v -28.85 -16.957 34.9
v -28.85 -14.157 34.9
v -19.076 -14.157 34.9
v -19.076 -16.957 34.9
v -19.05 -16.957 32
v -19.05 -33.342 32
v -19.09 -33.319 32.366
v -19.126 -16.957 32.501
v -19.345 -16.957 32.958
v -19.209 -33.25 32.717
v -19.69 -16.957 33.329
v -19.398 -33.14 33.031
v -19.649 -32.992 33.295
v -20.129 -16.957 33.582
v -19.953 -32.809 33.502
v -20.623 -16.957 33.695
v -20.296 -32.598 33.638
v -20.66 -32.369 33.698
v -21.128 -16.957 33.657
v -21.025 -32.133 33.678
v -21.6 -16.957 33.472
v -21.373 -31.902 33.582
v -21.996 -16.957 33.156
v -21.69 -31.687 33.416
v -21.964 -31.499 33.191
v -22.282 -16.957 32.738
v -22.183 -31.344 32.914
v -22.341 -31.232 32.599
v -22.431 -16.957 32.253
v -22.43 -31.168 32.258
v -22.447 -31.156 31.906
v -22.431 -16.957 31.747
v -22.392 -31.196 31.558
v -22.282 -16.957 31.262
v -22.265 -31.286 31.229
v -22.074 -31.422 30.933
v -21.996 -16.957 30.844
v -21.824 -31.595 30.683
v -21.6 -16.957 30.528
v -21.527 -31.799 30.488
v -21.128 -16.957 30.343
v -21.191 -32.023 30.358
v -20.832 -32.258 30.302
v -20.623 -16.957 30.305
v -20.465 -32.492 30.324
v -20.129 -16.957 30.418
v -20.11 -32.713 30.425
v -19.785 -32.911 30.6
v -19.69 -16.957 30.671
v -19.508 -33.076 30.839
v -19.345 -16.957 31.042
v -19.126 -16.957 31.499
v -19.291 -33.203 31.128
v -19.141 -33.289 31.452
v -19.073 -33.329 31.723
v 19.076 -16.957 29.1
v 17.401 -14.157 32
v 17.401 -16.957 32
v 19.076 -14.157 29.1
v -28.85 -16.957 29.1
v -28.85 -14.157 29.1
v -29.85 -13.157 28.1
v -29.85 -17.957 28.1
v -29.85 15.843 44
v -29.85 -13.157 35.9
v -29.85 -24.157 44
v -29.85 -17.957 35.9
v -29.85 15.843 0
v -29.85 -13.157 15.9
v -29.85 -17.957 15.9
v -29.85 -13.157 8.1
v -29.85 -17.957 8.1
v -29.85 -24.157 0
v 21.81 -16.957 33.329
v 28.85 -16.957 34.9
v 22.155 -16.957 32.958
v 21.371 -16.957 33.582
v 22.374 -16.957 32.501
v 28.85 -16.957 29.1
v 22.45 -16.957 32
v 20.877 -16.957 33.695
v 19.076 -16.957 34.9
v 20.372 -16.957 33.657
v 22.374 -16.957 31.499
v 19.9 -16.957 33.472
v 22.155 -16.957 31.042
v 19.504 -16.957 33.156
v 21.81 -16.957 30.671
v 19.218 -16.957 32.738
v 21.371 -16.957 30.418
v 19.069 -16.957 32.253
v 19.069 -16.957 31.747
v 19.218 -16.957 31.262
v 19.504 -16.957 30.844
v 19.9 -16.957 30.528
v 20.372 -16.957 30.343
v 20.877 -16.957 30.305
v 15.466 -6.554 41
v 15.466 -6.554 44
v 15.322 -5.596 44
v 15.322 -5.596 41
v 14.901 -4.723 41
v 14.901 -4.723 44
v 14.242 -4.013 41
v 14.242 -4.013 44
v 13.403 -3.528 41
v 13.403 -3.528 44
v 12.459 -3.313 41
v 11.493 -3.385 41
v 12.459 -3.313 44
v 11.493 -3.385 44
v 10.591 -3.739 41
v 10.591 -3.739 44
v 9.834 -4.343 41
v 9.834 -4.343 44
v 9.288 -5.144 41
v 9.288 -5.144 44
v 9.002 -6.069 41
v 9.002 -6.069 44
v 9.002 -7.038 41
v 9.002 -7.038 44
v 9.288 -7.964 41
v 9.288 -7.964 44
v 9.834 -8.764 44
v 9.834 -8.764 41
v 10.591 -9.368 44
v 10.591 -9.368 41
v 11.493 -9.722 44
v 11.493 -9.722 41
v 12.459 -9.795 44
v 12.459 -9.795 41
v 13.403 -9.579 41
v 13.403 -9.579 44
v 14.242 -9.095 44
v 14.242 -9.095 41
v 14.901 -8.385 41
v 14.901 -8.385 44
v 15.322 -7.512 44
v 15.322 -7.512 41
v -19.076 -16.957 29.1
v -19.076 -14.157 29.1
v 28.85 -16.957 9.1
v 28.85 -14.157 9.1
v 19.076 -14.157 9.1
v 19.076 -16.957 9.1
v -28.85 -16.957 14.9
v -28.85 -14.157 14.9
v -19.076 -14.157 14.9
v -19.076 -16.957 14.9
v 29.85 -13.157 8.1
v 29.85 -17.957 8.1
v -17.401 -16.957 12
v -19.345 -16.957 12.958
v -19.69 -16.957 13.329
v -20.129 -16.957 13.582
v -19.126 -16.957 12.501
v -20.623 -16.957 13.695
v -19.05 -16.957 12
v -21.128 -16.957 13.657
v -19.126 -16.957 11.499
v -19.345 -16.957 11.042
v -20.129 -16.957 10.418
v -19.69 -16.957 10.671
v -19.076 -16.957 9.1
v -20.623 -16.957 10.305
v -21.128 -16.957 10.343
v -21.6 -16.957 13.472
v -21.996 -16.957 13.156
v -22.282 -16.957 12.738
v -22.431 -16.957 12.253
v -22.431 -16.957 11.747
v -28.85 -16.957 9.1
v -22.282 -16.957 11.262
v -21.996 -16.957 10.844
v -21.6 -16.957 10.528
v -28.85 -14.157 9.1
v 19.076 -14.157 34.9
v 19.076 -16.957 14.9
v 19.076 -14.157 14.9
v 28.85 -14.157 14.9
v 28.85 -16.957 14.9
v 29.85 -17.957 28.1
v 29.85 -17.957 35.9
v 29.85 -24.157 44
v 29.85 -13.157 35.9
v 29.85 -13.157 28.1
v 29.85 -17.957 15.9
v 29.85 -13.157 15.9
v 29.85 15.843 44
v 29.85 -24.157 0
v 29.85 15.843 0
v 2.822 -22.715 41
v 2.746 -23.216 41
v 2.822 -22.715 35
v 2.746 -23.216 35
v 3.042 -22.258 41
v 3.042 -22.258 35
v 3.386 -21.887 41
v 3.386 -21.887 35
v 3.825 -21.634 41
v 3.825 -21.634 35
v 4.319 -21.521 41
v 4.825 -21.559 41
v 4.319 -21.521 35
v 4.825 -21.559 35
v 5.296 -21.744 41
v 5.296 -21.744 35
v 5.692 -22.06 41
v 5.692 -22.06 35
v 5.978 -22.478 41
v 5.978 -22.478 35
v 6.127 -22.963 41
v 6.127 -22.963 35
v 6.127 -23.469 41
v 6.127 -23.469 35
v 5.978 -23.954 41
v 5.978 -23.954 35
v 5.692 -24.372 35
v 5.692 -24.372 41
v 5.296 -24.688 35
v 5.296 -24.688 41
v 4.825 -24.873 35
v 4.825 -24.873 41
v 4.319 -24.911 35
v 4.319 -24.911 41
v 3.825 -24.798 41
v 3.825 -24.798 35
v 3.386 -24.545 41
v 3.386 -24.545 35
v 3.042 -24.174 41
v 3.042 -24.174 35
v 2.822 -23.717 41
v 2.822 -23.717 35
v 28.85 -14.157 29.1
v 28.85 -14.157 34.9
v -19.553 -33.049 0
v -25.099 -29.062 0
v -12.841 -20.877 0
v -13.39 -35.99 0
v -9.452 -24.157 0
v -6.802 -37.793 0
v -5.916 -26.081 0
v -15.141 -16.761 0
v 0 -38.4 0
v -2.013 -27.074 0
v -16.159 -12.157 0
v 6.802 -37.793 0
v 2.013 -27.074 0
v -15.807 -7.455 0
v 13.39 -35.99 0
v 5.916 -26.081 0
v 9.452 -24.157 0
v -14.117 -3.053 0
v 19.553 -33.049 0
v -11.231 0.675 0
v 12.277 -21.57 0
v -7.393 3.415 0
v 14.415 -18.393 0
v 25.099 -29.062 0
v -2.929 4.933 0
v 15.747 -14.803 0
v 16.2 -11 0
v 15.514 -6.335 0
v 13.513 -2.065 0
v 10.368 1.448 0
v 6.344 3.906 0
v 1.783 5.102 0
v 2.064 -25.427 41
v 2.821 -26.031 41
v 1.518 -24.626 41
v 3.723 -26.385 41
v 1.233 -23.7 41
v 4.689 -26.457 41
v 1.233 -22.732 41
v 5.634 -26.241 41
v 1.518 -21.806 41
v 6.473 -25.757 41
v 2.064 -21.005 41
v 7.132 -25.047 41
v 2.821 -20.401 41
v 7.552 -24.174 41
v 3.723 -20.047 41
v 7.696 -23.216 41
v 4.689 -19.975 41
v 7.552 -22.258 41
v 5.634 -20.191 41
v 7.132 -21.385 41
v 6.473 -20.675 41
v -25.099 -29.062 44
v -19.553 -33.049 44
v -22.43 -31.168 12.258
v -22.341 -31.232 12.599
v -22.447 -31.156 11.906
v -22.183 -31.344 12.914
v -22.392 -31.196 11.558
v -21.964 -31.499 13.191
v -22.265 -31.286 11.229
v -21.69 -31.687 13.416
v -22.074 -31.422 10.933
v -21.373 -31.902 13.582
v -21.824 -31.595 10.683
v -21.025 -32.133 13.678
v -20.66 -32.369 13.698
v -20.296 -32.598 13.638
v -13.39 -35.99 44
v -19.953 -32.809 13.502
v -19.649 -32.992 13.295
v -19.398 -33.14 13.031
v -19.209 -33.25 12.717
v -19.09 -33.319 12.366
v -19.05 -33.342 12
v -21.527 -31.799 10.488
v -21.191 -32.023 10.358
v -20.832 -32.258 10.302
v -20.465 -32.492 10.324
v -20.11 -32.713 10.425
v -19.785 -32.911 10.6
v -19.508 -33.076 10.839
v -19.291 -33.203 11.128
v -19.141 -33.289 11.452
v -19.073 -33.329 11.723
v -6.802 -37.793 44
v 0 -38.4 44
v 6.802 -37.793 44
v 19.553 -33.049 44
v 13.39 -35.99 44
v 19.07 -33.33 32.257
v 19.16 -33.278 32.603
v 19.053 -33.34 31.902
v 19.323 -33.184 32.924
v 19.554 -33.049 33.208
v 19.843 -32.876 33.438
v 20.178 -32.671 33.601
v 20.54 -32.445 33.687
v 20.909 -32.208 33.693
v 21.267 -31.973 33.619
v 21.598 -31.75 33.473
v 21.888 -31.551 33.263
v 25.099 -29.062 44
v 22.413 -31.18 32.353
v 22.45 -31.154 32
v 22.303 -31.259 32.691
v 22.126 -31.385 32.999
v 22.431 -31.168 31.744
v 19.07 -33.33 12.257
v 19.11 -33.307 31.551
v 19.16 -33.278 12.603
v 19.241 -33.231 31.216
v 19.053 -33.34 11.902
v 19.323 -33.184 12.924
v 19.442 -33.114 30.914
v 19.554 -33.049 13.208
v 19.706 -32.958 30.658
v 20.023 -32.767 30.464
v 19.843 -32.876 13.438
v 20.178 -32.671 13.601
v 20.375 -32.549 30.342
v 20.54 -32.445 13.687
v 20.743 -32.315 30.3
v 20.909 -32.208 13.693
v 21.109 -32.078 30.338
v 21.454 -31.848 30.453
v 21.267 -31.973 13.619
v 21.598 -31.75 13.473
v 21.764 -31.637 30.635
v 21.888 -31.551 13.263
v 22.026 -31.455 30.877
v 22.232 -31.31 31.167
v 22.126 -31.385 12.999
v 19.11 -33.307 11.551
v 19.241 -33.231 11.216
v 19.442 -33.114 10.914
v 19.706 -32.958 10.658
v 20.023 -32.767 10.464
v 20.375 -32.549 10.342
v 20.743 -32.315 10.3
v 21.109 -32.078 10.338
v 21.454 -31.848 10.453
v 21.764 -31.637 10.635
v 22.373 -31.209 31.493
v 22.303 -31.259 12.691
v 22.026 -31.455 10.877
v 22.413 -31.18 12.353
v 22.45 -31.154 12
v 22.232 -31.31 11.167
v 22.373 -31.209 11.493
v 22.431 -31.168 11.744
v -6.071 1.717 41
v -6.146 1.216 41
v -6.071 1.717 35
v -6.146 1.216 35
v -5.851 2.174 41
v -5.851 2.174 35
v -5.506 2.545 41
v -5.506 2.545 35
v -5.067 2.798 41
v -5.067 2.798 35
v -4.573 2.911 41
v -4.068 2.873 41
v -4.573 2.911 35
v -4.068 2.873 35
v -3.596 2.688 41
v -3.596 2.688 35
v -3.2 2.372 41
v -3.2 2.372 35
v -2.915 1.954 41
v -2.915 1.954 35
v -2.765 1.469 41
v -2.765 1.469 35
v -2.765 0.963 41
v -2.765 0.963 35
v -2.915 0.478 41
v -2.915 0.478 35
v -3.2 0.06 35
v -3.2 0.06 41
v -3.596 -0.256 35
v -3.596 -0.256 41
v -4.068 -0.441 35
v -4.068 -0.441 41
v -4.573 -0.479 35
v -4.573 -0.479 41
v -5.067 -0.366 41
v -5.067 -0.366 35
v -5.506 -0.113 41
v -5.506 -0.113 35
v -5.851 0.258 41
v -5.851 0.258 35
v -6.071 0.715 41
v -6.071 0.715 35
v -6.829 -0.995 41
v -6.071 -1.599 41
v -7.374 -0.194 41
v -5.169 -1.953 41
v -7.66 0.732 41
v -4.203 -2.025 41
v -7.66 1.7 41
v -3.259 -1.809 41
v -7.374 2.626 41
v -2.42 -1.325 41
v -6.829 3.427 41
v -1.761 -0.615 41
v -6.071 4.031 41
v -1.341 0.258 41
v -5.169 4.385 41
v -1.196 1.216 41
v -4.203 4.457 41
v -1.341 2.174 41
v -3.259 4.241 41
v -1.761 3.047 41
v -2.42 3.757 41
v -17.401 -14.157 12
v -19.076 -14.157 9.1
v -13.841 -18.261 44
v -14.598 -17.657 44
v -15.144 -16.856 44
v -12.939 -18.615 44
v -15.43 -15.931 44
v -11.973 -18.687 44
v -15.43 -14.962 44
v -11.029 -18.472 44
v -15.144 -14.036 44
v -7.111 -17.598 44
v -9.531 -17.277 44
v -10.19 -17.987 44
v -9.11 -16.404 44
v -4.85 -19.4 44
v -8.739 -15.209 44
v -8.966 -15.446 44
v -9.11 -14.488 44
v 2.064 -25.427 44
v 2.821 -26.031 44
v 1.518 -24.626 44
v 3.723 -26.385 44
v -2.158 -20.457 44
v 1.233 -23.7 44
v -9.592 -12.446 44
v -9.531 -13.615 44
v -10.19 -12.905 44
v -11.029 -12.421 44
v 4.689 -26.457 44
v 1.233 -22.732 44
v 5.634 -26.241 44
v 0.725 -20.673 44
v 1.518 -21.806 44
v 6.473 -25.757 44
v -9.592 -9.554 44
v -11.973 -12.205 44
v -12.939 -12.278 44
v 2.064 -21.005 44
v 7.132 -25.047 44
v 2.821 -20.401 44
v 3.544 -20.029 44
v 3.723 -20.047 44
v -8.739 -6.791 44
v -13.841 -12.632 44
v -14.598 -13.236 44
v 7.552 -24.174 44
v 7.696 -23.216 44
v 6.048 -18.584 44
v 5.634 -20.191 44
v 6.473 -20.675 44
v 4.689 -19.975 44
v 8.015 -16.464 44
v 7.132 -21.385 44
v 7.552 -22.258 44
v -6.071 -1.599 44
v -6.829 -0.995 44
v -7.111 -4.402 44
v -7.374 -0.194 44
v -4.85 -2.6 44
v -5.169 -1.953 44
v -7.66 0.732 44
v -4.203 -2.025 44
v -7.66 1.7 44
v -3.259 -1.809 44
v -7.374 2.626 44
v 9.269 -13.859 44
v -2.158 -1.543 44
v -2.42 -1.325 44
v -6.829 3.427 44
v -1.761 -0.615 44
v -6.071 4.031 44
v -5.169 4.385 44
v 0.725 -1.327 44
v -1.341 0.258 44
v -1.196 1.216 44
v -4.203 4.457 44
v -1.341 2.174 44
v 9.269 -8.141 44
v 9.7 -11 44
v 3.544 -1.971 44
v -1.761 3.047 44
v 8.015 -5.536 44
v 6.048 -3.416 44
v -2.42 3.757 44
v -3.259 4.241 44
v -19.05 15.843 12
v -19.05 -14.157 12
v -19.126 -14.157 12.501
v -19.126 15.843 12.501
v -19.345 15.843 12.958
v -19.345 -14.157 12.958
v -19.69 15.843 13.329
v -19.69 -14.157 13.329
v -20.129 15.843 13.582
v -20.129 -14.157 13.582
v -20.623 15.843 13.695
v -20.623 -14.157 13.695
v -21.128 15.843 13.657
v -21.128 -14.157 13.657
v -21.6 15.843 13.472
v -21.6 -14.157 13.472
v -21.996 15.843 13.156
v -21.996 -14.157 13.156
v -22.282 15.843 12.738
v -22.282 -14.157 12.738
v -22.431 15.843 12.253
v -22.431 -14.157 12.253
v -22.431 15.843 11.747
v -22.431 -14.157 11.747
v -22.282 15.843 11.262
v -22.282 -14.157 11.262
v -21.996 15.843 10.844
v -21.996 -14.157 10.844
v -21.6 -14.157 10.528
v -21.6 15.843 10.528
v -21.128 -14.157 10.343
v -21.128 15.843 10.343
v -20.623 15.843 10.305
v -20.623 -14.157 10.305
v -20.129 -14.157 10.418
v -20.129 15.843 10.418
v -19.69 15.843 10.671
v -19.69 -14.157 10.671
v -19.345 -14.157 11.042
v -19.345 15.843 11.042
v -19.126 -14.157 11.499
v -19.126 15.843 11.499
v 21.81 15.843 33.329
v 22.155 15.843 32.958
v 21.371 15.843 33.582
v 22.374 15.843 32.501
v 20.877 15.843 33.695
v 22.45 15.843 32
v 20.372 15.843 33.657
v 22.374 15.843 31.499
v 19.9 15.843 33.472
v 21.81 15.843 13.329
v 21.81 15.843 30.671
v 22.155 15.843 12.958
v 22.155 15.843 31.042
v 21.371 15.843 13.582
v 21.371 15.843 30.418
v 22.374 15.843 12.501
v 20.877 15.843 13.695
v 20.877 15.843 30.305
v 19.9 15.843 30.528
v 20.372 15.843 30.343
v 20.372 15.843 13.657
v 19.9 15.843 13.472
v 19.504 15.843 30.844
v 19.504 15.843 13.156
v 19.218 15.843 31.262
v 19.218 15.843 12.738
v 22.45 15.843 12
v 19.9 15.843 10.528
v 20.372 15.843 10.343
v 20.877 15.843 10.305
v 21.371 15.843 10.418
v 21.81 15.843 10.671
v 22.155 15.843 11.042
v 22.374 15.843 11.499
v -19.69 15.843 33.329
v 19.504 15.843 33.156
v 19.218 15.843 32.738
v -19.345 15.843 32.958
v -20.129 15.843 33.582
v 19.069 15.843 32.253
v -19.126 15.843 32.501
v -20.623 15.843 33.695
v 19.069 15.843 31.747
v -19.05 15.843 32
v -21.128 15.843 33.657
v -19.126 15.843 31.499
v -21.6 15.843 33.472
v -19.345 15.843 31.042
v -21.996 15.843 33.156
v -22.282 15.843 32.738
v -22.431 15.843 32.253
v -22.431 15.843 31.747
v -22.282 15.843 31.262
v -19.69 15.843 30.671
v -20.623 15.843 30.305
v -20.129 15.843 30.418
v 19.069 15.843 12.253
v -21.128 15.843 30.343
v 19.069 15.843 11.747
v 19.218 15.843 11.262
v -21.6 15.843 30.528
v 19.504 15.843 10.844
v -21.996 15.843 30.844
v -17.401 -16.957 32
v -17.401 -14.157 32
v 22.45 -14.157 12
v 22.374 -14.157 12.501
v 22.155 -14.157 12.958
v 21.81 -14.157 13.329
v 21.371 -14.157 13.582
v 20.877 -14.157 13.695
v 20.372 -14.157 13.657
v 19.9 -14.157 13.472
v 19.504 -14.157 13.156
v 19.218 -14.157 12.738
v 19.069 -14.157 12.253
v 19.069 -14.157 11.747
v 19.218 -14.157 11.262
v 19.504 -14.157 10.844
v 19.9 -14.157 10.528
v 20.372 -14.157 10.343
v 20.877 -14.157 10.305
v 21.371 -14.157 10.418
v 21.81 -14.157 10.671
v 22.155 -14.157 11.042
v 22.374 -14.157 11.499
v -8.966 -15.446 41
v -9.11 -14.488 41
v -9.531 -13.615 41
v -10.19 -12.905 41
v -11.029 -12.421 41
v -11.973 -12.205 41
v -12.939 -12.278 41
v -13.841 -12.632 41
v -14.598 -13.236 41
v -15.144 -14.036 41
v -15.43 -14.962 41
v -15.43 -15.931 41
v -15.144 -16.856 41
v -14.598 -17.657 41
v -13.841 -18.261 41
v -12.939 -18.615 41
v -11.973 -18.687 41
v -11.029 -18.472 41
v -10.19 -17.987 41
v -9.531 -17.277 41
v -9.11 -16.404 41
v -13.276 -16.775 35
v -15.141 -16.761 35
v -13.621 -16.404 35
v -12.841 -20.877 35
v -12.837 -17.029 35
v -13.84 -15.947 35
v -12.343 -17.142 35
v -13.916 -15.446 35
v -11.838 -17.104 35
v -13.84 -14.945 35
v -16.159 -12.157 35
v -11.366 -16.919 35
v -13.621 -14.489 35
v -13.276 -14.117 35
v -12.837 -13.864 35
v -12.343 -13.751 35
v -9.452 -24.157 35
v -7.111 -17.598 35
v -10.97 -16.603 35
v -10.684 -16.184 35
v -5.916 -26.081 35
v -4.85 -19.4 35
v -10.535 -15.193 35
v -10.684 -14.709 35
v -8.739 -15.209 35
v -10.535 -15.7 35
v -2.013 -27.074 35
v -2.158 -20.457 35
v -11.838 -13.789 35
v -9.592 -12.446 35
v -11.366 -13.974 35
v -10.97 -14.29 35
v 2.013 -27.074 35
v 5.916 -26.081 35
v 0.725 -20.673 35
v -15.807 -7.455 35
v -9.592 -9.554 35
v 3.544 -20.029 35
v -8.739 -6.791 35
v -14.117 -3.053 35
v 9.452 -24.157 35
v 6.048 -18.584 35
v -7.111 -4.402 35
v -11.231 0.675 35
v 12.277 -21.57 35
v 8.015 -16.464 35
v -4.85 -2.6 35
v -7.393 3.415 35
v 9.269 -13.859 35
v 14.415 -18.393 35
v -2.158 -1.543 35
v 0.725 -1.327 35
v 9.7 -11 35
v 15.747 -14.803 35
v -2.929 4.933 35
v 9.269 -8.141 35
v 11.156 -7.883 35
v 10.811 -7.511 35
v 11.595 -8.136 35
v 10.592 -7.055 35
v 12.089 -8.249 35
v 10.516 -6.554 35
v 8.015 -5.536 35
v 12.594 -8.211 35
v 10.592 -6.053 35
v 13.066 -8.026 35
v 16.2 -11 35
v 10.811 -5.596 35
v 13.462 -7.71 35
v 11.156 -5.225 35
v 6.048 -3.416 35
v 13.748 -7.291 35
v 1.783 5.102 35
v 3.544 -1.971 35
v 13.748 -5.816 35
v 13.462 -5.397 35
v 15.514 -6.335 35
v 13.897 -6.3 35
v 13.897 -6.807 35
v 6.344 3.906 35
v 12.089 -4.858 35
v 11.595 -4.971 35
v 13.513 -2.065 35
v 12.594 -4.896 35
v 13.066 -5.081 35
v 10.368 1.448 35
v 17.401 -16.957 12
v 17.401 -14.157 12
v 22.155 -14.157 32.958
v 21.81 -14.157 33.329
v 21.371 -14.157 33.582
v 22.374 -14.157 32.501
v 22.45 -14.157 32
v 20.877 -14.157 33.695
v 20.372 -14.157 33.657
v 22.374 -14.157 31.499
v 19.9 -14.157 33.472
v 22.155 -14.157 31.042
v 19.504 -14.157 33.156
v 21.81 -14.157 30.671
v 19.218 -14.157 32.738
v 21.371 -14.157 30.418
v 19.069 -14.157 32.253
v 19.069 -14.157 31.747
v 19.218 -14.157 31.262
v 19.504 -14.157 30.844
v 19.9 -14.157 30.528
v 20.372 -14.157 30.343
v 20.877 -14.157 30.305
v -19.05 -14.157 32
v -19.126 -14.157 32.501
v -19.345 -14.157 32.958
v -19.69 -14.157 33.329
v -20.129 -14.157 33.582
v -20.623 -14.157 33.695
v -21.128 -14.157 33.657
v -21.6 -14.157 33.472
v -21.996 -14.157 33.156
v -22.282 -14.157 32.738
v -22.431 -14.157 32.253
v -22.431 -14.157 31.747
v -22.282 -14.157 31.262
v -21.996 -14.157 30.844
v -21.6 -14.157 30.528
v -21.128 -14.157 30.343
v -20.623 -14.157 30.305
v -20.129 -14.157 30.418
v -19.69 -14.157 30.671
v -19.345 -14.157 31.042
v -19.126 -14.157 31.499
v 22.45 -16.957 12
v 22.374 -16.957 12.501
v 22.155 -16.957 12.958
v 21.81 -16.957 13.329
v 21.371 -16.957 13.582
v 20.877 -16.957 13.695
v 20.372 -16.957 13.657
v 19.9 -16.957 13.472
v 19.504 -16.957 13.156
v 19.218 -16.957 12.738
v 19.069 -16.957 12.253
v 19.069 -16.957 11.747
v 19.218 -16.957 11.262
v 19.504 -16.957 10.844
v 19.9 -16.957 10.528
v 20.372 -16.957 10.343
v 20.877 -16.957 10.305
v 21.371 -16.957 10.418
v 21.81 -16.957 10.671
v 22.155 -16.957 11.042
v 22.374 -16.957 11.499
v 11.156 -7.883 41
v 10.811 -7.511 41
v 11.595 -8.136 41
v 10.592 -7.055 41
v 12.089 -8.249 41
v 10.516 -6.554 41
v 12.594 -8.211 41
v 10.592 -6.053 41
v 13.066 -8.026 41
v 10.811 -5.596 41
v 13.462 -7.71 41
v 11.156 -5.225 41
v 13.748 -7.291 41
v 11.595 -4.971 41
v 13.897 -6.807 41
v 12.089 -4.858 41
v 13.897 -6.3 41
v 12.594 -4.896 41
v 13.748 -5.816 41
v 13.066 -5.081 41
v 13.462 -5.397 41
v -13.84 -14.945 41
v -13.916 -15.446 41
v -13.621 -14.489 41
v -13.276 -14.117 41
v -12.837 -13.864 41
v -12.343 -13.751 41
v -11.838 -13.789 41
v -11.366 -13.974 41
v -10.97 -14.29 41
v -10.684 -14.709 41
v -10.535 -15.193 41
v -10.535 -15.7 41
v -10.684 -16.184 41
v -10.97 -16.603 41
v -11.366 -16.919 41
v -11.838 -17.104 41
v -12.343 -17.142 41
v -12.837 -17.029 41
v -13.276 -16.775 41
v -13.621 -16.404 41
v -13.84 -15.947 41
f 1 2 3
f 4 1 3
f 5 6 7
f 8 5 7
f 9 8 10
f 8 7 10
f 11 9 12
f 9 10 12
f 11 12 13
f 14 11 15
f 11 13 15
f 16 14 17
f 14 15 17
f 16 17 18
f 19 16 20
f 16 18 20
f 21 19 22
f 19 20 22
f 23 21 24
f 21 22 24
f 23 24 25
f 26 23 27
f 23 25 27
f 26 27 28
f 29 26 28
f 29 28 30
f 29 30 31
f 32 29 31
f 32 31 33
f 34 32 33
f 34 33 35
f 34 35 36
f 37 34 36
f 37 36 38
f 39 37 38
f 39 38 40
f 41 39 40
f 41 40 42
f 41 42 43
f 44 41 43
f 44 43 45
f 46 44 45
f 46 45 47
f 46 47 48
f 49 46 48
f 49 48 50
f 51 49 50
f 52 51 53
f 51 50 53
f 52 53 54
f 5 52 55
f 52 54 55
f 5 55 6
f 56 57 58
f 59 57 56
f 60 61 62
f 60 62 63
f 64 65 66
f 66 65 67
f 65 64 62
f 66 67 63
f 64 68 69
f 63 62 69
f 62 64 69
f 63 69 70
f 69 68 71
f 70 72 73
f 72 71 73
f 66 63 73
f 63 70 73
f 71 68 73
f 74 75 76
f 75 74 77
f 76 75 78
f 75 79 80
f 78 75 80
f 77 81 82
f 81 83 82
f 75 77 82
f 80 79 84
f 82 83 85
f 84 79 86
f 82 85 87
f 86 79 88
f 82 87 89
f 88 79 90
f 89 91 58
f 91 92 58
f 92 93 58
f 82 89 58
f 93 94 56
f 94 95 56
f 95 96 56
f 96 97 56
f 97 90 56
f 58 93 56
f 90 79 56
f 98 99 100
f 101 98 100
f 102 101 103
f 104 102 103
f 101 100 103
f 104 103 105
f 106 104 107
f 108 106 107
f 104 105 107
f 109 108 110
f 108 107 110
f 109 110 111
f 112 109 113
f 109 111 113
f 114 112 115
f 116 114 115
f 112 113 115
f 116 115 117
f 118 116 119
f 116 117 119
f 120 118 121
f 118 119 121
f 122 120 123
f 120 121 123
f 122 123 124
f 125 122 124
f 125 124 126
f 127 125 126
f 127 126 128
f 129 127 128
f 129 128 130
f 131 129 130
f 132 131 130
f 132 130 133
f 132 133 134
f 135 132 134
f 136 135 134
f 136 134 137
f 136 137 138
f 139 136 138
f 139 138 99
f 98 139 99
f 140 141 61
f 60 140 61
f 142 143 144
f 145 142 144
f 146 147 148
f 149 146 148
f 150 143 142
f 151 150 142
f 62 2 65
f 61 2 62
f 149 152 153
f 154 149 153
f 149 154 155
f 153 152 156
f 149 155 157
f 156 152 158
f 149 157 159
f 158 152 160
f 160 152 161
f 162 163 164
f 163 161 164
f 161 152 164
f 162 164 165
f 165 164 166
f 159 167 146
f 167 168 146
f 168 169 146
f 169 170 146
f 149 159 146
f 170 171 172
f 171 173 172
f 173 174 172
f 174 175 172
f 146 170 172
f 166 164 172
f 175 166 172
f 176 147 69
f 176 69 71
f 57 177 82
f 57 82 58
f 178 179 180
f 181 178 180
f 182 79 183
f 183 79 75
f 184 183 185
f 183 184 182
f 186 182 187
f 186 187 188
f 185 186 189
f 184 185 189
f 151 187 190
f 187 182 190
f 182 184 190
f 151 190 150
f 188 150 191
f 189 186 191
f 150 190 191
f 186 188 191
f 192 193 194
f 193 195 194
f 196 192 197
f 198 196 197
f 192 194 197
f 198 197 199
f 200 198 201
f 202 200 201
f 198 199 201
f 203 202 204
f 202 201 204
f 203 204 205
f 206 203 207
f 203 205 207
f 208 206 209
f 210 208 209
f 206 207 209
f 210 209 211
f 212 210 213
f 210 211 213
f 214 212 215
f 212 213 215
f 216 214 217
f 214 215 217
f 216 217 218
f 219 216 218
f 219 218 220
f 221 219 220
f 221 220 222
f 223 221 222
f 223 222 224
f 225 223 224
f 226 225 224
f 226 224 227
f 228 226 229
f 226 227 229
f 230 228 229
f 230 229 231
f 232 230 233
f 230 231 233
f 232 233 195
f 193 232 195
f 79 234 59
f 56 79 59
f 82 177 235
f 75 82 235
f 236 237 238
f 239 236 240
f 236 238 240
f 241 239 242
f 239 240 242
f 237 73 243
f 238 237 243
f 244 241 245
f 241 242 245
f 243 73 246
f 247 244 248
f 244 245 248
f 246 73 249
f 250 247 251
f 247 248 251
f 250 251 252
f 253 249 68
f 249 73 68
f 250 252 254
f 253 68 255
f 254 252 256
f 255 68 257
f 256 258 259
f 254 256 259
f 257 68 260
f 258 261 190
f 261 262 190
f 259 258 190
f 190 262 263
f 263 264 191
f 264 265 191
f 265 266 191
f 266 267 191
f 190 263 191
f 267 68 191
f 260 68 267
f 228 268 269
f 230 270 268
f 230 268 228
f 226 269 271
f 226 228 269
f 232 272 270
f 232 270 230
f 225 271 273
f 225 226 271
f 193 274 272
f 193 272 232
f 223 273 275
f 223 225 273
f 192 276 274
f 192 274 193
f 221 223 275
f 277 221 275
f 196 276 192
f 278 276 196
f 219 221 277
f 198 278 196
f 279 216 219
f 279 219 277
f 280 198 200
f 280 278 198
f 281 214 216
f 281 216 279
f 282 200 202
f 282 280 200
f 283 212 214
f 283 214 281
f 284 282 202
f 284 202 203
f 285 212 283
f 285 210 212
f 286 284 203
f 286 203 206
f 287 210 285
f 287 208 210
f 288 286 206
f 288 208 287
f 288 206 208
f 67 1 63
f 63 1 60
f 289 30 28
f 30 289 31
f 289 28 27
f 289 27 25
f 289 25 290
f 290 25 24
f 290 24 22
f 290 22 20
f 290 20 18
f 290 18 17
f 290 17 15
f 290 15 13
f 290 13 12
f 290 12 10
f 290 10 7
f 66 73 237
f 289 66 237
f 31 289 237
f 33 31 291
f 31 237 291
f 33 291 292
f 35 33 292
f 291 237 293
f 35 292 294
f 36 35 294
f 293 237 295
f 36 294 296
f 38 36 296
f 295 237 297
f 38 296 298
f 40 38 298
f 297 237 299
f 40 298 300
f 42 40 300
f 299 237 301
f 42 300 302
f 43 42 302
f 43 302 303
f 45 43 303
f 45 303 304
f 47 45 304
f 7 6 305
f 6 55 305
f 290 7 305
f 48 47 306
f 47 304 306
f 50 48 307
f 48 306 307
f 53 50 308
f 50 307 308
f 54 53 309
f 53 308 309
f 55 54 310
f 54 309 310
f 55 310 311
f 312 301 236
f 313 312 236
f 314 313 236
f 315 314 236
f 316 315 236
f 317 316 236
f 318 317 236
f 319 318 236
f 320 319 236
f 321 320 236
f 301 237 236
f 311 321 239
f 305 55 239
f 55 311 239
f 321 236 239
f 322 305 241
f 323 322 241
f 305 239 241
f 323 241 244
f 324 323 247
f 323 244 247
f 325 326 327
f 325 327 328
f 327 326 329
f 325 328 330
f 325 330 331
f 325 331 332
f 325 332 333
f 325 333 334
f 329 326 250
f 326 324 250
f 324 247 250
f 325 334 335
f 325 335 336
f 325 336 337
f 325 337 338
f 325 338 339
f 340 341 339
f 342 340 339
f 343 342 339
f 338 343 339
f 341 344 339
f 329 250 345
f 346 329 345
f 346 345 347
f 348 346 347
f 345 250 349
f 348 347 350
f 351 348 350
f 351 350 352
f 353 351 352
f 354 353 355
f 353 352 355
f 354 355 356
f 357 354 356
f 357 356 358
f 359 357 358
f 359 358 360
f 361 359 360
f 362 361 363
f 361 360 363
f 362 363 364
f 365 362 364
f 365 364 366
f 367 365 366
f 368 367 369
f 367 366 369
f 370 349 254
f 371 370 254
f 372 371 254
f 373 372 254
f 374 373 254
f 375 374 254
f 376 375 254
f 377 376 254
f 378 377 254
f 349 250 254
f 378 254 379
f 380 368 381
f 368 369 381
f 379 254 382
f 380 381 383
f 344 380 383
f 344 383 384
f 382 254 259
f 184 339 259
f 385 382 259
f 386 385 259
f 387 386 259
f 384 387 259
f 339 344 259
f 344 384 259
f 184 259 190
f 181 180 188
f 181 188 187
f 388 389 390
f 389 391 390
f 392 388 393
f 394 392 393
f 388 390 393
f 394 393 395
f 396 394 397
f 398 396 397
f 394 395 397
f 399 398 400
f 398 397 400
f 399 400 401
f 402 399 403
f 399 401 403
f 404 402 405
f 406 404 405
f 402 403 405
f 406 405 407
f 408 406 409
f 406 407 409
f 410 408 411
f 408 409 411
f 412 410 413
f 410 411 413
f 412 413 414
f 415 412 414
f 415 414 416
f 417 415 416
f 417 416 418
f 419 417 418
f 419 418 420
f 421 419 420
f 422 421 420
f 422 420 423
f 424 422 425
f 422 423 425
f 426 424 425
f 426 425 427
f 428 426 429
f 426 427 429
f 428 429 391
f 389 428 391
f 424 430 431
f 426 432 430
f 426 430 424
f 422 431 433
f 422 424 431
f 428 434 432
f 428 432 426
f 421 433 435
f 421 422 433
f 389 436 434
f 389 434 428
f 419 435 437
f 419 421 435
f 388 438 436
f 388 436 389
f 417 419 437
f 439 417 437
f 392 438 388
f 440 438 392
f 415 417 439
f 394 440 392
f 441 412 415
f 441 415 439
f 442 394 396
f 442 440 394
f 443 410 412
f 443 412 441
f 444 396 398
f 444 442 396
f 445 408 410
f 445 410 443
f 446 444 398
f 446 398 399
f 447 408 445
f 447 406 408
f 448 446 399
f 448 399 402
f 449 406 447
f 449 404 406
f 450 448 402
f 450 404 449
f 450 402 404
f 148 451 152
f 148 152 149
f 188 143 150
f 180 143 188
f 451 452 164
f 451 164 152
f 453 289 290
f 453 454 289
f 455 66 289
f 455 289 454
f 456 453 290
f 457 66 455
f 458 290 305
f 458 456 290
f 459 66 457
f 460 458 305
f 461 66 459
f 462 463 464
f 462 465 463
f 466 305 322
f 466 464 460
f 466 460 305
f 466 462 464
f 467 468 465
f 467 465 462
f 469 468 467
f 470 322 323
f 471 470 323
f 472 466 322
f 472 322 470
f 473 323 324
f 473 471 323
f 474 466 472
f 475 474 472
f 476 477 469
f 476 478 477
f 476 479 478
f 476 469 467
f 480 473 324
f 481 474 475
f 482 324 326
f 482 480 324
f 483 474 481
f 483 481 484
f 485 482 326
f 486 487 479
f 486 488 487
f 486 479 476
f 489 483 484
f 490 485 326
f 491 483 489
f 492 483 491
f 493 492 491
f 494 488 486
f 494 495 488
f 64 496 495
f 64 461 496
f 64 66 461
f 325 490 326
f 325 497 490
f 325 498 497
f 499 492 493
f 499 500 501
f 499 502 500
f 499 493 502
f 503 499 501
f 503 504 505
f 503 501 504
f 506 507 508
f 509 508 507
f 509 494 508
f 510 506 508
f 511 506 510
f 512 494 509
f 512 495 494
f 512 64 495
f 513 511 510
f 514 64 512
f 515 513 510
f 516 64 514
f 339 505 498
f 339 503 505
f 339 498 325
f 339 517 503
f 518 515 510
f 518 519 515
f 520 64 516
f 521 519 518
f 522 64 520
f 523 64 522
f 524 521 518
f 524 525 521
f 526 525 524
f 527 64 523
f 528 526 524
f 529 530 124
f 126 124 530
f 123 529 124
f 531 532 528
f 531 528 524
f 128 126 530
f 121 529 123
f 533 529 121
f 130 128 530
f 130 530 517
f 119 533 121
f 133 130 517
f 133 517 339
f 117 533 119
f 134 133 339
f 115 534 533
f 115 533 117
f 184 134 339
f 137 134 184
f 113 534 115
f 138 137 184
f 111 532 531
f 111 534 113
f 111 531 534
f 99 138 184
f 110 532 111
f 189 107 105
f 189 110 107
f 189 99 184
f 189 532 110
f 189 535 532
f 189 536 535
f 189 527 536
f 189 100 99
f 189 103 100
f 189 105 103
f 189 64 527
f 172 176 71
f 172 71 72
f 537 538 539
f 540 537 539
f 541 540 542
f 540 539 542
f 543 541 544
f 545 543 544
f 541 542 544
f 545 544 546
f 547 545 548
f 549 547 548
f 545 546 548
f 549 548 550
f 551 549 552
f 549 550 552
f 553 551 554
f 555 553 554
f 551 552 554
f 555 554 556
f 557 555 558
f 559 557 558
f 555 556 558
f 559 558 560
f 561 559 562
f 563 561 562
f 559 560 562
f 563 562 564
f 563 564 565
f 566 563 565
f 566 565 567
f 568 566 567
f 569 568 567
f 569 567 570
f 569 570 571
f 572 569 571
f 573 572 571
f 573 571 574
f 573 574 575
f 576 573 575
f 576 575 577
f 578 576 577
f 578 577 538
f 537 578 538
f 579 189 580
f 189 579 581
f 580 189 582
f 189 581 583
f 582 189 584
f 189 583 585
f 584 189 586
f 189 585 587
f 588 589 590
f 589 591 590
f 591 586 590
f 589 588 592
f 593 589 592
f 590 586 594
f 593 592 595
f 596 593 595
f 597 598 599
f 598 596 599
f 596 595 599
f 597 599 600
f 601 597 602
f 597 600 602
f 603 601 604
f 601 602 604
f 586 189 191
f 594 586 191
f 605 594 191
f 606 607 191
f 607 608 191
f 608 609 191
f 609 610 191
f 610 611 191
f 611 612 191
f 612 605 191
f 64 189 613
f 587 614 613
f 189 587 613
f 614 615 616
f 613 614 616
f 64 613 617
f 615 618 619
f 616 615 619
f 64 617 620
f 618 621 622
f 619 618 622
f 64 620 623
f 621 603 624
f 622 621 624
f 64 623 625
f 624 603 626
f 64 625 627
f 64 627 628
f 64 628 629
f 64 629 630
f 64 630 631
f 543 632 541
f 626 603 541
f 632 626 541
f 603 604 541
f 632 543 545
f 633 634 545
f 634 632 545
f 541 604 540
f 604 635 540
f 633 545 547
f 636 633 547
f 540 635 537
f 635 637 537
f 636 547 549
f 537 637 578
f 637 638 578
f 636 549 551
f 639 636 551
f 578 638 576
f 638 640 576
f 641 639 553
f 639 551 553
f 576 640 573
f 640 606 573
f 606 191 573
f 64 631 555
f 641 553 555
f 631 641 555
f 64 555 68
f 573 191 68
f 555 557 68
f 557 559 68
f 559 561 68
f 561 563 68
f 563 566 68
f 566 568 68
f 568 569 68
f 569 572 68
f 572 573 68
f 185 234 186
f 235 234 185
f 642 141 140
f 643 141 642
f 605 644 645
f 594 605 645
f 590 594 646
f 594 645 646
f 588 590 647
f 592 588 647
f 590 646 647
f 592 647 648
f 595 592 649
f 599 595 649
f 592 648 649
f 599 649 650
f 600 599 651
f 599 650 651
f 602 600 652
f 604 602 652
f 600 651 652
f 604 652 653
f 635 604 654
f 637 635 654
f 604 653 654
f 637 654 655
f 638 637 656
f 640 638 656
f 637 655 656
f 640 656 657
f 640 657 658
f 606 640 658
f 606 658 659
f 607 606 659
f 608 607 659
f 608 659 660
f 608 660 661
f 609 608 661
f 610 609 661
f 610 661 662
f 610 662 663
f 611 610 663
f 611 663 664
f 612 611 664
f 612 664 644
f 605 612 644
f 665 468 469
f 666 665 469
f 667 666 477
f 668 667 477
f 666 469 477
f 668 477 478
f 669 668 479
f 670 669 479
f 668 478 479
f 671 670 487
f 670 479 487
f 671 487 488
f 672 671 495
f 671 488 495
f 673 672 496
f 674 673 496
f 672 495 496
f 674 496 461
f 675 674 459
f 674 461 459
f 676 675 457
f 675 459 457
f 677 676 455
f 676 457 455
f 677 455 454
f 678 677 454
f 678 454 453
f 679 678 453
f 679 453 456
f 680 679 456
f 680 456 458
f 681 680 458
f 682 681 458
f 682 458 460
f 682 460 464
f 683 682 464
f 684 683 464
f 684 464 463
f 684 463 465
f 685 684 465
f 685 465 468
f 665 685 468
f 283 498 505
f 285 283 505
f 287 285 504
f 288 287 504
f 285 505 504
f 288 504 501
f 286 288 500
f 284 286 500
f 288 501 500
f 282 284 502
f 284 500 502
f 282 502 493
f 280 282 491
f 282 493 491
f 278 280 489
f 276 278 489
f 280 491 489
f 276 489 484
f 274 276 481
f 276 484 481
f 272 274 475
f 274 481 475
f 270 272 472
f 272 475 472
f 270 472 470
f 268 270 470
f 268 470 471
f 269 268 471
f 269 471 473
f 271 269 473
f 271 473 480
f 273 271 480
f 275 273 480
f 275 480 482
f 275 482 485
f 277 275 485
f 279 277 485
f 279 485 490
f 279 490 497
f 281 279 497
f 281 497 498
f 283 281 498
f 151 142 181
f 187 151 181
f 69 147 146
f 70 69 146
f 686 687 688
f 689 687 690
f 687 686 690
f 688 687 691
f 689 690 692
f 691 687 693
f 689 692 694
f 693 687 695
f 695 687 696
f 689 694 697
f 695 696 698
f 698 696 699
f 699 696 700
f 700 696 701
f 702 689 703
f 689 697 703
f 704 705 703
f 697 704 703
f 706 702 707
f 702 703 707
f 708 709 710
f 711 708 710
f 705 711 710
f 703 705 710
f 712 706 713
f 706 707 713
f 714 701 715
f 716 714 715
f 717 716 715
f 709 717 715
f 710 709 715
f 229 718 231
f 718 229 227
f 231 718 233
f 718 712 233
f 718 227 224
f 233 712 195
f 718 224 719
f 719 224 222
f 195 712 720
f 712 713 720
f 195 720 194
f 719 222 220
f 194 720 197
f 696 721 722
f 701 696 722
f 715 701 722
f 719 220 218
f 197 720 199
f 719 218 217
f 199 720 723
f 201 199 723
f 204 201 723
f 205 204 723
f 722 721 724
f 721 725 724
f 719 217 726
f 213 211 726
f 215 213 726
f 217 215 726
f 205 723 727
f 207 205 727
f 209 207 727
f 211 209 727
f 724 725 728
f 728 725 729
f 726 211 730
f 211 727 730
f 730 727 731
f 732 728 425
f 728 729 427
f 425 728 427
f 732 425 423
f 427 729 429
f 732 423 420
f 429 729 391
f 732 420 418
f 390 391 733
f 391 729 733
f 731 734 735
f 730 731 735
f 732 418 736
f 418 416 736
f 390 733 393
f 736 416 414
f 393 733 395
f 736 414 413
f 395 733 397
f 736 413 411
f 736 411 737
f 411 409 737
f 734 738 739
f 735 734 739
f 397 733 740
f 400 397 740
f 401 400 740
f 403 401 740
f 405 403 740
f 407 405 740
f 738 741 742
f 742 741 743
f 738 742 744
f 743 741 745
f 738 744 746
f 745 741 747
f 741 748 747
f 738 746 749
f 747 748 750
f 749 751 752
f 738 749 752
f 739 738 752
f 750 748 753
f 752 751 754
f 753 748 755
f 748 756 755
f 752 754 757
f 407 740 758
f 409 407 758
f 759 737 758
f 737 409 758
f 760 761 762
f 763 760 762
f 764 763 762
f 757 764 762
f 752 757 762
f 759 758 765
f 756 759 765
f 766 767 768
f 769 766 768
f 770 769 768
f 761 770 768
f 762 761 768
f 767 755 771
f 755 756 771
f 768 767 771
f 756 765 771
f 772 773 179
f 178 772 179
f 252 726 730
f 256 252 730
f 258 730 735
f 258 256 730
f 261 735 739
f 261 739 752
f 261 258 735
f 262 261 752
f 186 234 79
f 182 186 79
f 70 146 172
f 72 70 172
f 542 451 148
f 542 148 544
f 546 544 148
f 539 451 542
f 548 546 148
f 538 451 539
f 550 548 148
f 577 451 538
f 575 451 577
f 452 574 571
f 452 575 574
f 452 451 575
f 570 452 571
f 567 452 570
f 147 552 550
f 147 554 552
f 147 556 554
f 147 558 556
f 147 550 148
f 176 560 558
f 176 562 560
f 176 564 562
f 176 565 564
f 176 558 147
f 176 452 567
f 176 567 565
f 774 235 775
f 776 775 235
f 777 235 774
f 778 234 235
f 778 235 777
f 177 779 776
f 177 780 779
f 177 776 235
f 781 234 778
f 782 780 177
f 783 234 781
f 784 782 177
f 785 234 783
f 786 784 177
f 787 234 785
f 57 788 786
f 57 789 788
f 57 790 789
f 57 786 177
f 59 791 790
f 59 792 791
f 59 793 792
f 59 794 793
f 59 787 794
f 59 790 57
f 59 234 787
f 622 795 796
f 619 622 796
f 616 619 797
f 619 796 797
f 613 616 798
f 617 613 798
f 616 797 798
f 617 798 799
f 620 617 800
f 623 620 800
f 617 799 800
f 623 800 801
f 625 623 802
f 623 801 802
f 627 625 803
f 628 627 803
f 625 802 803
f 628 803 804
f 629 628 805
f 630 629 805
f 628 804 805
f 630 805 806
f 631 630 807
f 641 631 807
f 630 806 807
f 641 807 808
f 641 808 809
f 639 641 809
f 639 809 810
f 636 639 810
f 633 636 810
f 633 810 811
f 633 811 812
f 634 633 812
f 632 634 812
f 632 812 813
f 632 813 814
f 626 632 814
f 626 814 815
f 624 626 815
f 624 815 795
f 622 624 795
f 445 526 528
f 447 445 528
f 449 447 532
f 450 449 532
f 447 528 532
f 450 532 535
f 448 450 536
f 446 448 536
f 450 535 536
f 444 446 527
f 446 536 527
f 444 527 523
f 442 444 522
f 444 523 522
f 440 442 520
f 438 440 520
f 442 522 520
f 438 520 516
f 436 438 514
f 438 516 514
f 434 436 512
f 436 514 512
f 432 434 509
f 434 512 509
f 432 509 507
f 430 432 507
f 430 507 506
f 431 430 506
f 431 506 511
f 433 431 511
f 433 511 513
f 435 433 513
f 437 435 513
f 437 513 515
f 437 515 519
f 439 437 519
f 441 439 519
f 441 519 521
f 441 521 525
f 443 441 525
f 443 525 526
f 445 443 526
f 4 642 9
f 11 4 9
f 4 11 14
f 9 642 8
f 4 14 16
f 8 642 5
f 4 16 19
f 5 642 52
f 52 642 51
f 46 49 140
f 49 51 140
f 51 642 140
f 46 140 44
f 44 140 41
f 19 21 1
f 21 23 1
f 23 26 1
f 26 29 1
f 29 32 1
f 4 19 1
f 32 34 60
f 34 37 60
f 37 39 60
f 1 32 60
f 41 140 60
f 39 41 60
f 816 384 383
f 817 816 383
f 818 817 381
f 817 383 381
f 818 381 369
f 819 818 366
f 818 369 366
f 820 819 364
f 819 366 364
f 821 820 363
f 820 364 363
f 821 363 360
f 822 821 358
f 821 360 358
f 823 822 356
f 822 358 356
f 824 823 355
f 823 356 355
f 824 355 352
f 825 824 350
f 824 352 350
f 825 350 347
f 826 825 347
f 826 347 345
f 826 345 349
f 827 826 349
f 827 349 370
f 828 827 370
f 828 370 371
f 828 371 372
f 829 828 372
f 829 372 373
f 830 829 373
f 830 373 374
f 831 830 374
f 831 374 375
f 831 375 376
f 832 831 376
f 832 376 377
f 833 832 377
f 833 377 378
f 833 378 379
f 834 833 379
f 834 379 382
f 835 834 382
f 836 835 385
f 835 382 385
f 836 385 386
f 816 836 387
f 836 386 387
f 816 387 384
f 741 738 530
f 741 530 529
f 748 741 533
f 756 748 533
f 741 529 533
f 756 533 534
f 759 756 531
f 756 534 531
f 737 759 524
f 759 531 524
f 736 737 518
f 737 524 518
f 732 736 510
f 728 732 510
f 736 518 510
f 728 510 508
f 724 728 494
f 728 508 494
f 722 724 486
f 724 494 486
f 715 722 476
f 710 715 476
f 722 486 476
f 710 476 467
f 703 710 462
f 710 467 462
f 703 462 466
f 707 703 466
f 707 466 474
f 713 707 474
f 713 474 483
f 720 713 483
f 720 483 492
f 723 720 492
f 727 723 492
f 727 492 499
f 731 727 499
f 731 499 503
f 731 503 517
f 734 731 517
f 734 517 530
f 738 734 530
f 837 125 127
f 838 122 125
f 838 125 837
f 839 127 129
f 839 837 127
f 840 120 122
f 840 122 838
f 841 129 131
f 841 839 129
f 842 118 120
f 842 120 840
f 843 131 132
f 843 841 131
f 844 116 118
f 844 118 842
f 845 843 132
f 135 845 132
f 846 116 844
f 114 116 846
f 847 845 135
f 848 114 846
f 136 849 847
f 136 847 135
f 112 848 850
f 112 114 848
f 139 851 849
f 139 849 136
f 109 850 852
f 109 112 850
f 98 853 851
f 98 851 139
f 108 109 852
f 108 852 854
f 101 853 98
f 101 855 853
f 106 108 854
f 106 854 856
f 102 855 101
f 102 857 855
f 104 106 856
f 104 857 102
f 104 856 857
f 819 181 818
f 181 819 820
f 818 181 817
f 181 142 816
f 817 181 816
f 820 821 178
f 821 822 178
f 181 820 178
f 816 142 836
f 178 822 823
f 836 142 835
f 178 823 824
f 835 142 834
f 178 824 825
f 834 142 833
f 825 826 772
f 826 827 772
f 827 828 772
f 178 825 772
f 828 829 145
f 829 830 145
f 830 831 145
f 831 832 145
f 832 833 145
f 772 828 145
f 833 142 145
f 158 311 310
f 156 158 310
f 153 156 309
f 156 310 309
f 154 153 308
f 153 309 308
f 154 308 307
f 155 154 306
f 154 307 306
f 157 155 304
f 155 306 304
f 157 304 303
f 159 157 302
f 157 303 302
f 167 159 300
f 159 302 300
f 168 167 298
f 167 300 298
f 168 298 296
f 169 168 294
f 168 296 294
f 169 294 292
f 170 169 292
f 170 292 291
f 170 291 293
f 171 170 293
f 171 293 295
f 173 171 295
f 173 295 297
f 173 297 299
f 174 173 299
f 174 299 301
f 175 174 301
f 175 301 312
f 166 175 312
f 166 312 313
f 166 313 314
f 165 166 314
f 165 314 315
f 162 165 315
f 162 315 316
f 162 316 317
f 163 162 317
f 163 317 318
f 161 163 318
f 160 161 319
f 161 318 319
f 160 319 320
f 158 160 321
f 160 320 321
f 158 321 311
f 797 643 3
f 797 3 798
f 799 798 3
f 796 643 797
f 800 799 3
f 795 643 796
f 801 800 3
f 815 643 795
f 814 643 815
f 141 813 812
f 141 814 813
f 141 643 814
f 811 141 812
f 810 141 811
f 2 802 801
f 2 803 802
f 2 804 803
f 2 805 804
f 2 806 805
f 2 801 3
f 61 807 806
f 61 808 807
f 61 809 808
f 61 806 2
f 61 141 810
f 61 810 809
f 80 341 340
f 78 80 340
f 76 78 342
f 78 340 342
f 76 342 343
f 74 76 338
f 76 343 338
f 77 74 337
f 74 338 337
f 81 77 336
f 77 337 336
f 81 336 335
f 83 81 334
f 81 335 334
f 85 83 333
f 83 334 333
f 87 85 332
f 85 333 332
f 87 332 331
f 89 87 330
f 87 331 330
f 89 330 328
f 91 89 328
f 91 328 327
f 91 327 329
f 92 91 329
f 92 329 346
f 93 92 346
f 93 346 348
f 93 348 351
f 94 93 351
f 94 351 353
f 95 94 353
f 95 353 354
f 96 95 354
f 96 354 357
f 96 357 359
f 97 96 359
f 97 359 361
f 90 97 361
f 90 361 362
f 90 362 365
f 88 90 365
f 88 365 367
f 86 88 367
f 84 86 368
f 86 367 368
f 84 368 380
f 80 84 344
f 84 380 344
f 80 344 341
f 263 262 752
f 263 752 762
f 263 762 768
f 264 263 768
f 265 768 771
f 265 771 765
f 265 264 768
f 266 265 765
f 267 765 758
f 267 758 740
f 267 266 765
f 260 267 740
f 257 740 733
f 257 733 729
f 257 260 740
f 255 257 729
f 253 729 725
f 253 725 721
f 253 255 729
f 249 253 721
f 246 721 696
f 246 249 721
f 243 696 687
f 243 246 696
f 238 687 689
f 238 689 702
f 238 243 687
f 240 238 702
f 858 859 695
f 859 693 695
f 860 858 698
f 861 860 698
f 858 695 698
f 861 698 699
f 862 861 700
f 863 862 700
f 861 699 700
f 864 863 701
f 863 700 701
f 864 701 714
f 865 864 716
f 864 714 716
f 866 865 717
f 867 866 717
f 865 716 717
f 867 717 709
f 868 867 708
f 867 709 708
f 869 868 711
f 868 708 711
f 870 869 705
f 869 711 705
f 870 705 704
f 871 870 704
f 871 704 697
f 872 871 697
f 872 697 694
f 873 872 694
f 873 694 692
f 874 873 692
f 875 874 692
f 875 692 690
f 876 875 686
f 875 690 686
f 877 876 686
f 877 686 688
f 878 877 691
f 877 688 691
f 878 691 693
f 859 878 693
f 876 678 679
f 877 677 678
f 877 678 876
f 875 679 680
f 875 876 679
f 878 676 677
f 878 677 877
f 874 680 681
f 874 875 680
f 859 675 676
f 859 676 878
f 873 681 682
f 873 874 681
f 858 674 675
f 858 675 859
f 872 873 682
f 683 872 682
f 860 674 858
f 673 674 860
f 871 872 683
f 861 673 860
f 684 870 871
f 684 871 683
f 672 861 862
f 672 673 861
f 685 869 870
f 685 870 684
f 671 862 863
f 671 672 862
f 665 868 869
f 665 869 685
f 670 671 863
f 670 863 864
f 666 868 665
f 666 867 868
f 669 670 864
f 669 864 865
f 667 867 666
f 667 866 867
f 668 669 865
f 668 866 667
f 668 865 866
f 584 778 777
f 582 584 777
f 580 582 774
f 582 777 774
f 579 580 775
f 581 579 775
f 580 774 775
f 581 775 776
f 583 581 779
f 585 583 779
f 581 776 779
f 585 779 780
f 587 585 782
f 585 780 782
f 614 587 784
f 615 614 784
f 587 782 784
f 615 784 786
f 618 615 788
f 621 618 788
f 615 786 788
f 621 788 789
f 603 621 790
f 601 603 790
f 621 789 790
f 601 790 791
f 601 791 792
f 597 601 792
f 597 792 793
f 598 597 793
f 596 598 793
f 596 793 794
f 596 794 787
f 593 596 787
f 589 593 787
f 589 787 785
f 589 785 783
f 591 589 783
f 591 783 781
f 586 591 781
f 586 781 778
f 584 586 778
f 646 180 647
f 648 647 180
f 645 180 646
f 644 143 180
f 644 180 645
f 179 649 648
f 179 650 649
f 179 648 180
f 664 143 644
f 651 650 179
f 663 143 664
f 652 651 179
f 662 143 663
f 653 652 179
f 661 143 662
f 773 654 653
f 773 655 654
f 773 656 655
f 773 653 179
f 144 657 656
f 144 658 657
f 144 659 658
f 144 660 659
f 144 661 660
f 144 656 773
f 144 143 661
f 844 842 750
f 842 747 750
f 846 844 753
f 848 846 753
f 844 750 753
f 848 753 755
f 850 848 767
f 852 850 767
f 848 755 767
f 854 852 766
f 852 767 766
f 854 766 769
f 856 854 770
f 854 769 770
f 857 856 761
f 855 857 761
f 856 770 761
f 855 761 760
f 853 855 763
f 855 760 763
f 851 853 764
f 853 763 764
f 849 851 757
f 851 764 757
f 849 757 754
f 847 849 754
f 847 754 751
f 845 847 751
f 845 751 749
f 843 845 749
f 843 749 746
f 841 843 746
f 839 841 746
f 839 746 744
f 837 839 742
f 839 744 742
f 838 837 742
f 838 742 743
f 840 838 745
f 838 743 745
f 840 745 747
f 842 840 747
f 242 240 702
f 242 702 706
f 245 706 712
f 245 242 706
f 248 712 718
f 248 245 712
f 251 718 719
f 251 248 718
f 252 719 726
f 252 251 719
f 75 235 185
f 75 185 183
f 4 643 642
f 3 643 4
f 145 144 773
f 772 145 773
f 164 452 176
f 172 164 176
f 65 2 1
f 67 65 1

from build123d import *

# Parameters (mm, degrees)
BOSS_EXTRUDE1_DEPTH            = 44
CUT_EXTRUDE1_DEPTH             = 35
CUT_EXTRUDE2_REACH             = 67.586
SKETCH2_R                      = 9.7
CBORE_FOR_M3_SHCS1_D           = 3.4
CBORE_FOR_M3_SHCS1_CBORE_D     = 6.5
CBORE_FOR_M3_SHCS1_CBORE_DEPTH = 3
CUT_EXTRUDE3_REACH             = 82.169
SKETCH6_R                      = 1.7
CUT_EXTRUDE4_DEPTH             = 2.8
CHAMFER1_SIZE                  = 1


with BuildPart() as part:
    # Sketch1 → Boss-Extrude1 (new body)
    with BuildSketch(Plane.XY):
        with BuildLine():
            Line((-9.452299133, -24.156520859), (-29.85, -24.156520859))
            ThreePointArc((-29.85, -24.156520859), (0, -38.4), (29.85, -24.156520859))
            Line((29.85, -24.156520859), (9.452299133, -24.156520859))
            ThreePointArc((9.452299133, -24.156520859), (0, -27.2), (-9.452299133, -24.156520859))
        make_face()
        with BuildLine():
            Line((29.85, 15.843479141), (-29.85, 15.843479141))
            Line((-29.85, 15.843479141), (-29.85, -24.156520859))
            Line((-29.85, -24.156520859), (-9.452299133, -24.156520859))
            ThreePointArc((-9.452299133, -24.156520859), (-7.392995132, 3.414701626), (16.2, -11))
            ThreePointArc((16.2, -11), (14.414701626, -18.392995132), (9.452299133, -24.156520859))
            Line((9.452299133, -24.156520859), (29.85, -24.156520859))
            Line((29.85, -24.156520859), (29.85, 15.843479141))
        make_face()
        with BuildLine():
            ThreePointArc((16.2, -11), (-7.392995132, 3.414701626), (-9.452299133, -24.156520859))
            Line((-9.452299133, -24.156520859), (9.452299133, -24.156520859))
            ThreePointArc((9.452299133, -24.156520859), (14.414701626, -18.392995132), (16.2, -11))
        make_face()
        with BuildLine():
            Line((9.452299133, -24.156520859), (-9.452299133, -24.156520859))
            ThreePointArc((-9.452299133, -24.156520859), (0, -27.2), (9.452299133, -24.156520859))
        make_face()
    extrude(amount=BOSS_EXTRUDE1_DEPTH)

    # Sketch1<3> → Cut-Extrude1 (cut)
    with BuildSketch(Plane.XY):
        with BuildLine():
            ThreePointArc((16.2, -11), (-7.392995132, 3.414701626), (-9.452299133, -24.156520859))
            Line((-9.452299133, -24.156520859), (9.452299133, -24.156520859))
            ThreePointArc((9.452299133, -24.156520859), (14.414701626, -18.392995132), (16.2, -11))
        make_face()
        with BuildLine():
            Line((9.452299133, -24.156520859), (-9.452299133, -24.156520859))
            ThreePointArc((-9.452299133, -24.156520859), (0, -27.2), (9.452299133, -24.156520859))
        make_face()
    extrude(amount=CUT_EXTRUDE1_DEPTH, mode=Mode.SUBTRACT)

    # Sketch2 → Cut-Extrude2 (cut, up to next)
    with BuildSketch(Plane.XY.offset(44), mode=Mode.PRIVATE) as cut_extrude2_sk1:
        with Locations((0, -11)):
            Circle(SKETCH2_R)
    cut_extrude2_tool1 = extrude(cut_extrude2_sk1.sketch, amount=-CUT_EXTRUDE2_REACH, mode=Mode.PRIVATE) & part.part
    add(cut_extrude2_tool1.solids().sort_by_distance((0, -11, 44))[0], mode=Mode.SUBTRACT)

    # CBORE for M3 SHCS1 (through all)
    with Locations(Plane.XY.offset(44)):
        with Locations((-12.21600407, -15.446261863), (12.21600407, -6.553738137), (4.446261863, -23.21600407), (-4.446261863, 1.21600407)):
            CounterBoreHole(CBORE_FOR_M3_SHCS1_D / 2, CBORE_FOR_M3_SHCS1_CBORE_D / 2, CBORE_FOR_M3_SHCS1_CBORE_DEPTH)

    # Sketch6 → Cut-Extrude3 (cut, up to next)
    with BuildSketch(Plane(origin=(0, -44.156520859, 0), x_dir=(-1, 0, 0), z_dir=(0, -1, 0)), mode=Mode.PRIVATE) as cut_extrude3_sk1:
        with Locations(Location((20.75, -12, 0), (0, 0, 180))):
            Circle(SKETCH6_R)
    cut_extrude3_tool1 = extrude(cut_extrude3_sk1.sketch, amount=-CUT_EXTRUDE3_REACH, mode=Mode.PRIVATE) & part.part
    # Sketch6 → Cut-Extrude3 (cut, up to next)
    with BuildSketch(Plane(origin=(0, -44.156520859, 0), x_dir=(-1, 0, 0), z_dir=(0, -1, 0)), mode=Mode.PRIVATE) as cut_extrude3_sk2:
        with Locations(Location((-20.75, -12, 0), (0, 0, 180))):
            Circle(SKETCH6_R)
    cut_extrude3_tool2 = extrude(cut_extrude3_sk2.sketch, amount=-CUT_EXTRUDE3_REACH, mode=Mode.PRIVATE) & part.part
    # Sketch6 → Cut-Extrude3 (cut, up to next)
    with BuildSketch(Plane(origin=(0, -44.156520859, 0), x_dir=(-1, 0, 0), z_dir=(0, -1, 0)), mode=Mode.PRIVATE) as cut_extrude3_sk3:
        with Locations(Location((20.75, -32, 0), (0, 0, 180))):
            Circle(SKETCH6_R)
    cut_extrude3_tool3 = extrude(cut_extrude3_sk3.sketch, amount=-CUT_EXTRUDE3_REACH, mode=Mode.PRIVATE) & part.part
    # Sketch6 → Cut-Extrude3 (cut, up to next)
    with BuildSketch(Plane(origin=(0, -44.156520859, 0), x_dir=(-1, 0, 0), z_dir=(0, -1, 0)), mode=Mode.PRIVATE) as cut_extrude3_sk4:
        with Locations(Location((-20.75, -32, 0), (0, 0, 180))):
            Circle(SKETCH6_R)
    cut_extrude3_tool4 = extrude(cut_extrude3_sk4.sketch, amount=-CUT_EXTRUDE3_REACH, mode=Mode.PRIVATE) & part.part
    add(cut_extrude3_tool1.solids().sort_by_distance((-20.75, -44.156521, 12))[0], mode=Mode.SUBTRACT)
    add(cut_extrude3_tool2.solids().sort_by_distance((20.75, -44.156521, 12))[0], mode=Mode.SUBTRACT)
    add(cut_extrude3_tool3.solids().sort_by_distance((-20.75, -44.156521, 32))[0], mode=Mode.SUBTRACT)
    add(cut_extrude3_tool4.solids().sort_by_distance((20.75, -44.156521, 32))[0], mode=Mode.SUBTRACT)

    # Sketch7 → Cut-Extrude4 (cut)
    with BuildSketch(Plane(origin=(0, -14.156520859, 0), x_dir=(1, 0, 0), z_dir=(0, 1, 0))):
        Polygon((-29.85, -14.9), (-29.85, -9.1), (-22.424315781, -9.1), (-24.098631561, -12), (-22.424315781, -14.9), align=None)
        Polygon((-24.098631561, -12), (-22.424315781, -14.9), (-22.424315781, -9.1), align=None)
        Polygon((-22.424315781, -14.9), (-22.424315781, -9.1), (-19.075684219, -9.1), (-17.401368439, -12), (-19.075684219, -14.9), align=None)
        Polygon((-29.85, -34.9), (-29.85, -29.1), (-22.424315781, -29.1), (-24.098631561, -32), (-22.424315781, -34.9), align=None)
        Polygon((-24.098631561, -32), (-22.424315781, -34.9), (-22.424315781, -29.1), align=None)
        Polygon((-22.424315781, -34.9), (-22.424315781, -29.1), (-19.075684219, -29.1), (-17.401368439, -32), (-19.075684219, -34.9), align=None)
        Polygon((22.424315781, -29.1), (22.424315781, -34.9), (19.075684219, -34.9), (17.401368439, -32), (19.075684219, -29.1), align=None)
        Polygon((29.85, -29.1), (29.85, -34.9), (22.424315781, -34.9), (24.098631561, -32), (22.424315781, -29.1), align=None)
        Polygon((24.098631561, -32), (22.424315781, -29.1), (22.424315781, -34.9), align=None)
        Polygon((24.098631561, -12), (22.424315781, -9.1), (29.85, -9.1), (29.85, -14.9), (22.424315781, -14.9), align=None)
        Polygon((22.424315781, -14.9), (24.098631561, -12), (22.424315781, -9.1), align=None)
        Polygon((22.424315781, -9.1), (19.075684219, -9.1), (17.401368439, -12), (19.075684219, -14.9), (22.424315781, -14.9), align=None)
    extrude(amount=-CUT_EXTRUDE4_DEPTH, mode=Mode.SUBTRACT)

    # Chamfer1
    chamfer1_edges = [part.edges().sort_by_distance(p)[0] for p in [
        (29.85, -16.956520859, 32),
        (29.85, -14.156520859, 32),
        (29.85, -15.556520859, 29.1),
        (29.85, -15.556520859, 34.9),
        (-29.85, -16.956520859, 32),
        (-29.85, -14.156520859, 32),
        (-29.85, -15.556520859, 34.9),
        (-29.85, -15.556520859, 29.1),
        (-29.85, -16.956520859, 12),
        (-29.85, -14.156520859, 12),
        (-29.85, -15.556520859, 14.9),
        (-29.85, -15.556520859, 9.1),
        (29.85, -16.956520859, 12),
        (29.85, -14.156520859, 12),
        (29.85, -15.556520859, 9.1),
        (29.85, -15.556520859, 14.9),
    ]]
    chamfer(chamfer1_edges, length=CHAMFER1_SIZE)


solid = part.part
